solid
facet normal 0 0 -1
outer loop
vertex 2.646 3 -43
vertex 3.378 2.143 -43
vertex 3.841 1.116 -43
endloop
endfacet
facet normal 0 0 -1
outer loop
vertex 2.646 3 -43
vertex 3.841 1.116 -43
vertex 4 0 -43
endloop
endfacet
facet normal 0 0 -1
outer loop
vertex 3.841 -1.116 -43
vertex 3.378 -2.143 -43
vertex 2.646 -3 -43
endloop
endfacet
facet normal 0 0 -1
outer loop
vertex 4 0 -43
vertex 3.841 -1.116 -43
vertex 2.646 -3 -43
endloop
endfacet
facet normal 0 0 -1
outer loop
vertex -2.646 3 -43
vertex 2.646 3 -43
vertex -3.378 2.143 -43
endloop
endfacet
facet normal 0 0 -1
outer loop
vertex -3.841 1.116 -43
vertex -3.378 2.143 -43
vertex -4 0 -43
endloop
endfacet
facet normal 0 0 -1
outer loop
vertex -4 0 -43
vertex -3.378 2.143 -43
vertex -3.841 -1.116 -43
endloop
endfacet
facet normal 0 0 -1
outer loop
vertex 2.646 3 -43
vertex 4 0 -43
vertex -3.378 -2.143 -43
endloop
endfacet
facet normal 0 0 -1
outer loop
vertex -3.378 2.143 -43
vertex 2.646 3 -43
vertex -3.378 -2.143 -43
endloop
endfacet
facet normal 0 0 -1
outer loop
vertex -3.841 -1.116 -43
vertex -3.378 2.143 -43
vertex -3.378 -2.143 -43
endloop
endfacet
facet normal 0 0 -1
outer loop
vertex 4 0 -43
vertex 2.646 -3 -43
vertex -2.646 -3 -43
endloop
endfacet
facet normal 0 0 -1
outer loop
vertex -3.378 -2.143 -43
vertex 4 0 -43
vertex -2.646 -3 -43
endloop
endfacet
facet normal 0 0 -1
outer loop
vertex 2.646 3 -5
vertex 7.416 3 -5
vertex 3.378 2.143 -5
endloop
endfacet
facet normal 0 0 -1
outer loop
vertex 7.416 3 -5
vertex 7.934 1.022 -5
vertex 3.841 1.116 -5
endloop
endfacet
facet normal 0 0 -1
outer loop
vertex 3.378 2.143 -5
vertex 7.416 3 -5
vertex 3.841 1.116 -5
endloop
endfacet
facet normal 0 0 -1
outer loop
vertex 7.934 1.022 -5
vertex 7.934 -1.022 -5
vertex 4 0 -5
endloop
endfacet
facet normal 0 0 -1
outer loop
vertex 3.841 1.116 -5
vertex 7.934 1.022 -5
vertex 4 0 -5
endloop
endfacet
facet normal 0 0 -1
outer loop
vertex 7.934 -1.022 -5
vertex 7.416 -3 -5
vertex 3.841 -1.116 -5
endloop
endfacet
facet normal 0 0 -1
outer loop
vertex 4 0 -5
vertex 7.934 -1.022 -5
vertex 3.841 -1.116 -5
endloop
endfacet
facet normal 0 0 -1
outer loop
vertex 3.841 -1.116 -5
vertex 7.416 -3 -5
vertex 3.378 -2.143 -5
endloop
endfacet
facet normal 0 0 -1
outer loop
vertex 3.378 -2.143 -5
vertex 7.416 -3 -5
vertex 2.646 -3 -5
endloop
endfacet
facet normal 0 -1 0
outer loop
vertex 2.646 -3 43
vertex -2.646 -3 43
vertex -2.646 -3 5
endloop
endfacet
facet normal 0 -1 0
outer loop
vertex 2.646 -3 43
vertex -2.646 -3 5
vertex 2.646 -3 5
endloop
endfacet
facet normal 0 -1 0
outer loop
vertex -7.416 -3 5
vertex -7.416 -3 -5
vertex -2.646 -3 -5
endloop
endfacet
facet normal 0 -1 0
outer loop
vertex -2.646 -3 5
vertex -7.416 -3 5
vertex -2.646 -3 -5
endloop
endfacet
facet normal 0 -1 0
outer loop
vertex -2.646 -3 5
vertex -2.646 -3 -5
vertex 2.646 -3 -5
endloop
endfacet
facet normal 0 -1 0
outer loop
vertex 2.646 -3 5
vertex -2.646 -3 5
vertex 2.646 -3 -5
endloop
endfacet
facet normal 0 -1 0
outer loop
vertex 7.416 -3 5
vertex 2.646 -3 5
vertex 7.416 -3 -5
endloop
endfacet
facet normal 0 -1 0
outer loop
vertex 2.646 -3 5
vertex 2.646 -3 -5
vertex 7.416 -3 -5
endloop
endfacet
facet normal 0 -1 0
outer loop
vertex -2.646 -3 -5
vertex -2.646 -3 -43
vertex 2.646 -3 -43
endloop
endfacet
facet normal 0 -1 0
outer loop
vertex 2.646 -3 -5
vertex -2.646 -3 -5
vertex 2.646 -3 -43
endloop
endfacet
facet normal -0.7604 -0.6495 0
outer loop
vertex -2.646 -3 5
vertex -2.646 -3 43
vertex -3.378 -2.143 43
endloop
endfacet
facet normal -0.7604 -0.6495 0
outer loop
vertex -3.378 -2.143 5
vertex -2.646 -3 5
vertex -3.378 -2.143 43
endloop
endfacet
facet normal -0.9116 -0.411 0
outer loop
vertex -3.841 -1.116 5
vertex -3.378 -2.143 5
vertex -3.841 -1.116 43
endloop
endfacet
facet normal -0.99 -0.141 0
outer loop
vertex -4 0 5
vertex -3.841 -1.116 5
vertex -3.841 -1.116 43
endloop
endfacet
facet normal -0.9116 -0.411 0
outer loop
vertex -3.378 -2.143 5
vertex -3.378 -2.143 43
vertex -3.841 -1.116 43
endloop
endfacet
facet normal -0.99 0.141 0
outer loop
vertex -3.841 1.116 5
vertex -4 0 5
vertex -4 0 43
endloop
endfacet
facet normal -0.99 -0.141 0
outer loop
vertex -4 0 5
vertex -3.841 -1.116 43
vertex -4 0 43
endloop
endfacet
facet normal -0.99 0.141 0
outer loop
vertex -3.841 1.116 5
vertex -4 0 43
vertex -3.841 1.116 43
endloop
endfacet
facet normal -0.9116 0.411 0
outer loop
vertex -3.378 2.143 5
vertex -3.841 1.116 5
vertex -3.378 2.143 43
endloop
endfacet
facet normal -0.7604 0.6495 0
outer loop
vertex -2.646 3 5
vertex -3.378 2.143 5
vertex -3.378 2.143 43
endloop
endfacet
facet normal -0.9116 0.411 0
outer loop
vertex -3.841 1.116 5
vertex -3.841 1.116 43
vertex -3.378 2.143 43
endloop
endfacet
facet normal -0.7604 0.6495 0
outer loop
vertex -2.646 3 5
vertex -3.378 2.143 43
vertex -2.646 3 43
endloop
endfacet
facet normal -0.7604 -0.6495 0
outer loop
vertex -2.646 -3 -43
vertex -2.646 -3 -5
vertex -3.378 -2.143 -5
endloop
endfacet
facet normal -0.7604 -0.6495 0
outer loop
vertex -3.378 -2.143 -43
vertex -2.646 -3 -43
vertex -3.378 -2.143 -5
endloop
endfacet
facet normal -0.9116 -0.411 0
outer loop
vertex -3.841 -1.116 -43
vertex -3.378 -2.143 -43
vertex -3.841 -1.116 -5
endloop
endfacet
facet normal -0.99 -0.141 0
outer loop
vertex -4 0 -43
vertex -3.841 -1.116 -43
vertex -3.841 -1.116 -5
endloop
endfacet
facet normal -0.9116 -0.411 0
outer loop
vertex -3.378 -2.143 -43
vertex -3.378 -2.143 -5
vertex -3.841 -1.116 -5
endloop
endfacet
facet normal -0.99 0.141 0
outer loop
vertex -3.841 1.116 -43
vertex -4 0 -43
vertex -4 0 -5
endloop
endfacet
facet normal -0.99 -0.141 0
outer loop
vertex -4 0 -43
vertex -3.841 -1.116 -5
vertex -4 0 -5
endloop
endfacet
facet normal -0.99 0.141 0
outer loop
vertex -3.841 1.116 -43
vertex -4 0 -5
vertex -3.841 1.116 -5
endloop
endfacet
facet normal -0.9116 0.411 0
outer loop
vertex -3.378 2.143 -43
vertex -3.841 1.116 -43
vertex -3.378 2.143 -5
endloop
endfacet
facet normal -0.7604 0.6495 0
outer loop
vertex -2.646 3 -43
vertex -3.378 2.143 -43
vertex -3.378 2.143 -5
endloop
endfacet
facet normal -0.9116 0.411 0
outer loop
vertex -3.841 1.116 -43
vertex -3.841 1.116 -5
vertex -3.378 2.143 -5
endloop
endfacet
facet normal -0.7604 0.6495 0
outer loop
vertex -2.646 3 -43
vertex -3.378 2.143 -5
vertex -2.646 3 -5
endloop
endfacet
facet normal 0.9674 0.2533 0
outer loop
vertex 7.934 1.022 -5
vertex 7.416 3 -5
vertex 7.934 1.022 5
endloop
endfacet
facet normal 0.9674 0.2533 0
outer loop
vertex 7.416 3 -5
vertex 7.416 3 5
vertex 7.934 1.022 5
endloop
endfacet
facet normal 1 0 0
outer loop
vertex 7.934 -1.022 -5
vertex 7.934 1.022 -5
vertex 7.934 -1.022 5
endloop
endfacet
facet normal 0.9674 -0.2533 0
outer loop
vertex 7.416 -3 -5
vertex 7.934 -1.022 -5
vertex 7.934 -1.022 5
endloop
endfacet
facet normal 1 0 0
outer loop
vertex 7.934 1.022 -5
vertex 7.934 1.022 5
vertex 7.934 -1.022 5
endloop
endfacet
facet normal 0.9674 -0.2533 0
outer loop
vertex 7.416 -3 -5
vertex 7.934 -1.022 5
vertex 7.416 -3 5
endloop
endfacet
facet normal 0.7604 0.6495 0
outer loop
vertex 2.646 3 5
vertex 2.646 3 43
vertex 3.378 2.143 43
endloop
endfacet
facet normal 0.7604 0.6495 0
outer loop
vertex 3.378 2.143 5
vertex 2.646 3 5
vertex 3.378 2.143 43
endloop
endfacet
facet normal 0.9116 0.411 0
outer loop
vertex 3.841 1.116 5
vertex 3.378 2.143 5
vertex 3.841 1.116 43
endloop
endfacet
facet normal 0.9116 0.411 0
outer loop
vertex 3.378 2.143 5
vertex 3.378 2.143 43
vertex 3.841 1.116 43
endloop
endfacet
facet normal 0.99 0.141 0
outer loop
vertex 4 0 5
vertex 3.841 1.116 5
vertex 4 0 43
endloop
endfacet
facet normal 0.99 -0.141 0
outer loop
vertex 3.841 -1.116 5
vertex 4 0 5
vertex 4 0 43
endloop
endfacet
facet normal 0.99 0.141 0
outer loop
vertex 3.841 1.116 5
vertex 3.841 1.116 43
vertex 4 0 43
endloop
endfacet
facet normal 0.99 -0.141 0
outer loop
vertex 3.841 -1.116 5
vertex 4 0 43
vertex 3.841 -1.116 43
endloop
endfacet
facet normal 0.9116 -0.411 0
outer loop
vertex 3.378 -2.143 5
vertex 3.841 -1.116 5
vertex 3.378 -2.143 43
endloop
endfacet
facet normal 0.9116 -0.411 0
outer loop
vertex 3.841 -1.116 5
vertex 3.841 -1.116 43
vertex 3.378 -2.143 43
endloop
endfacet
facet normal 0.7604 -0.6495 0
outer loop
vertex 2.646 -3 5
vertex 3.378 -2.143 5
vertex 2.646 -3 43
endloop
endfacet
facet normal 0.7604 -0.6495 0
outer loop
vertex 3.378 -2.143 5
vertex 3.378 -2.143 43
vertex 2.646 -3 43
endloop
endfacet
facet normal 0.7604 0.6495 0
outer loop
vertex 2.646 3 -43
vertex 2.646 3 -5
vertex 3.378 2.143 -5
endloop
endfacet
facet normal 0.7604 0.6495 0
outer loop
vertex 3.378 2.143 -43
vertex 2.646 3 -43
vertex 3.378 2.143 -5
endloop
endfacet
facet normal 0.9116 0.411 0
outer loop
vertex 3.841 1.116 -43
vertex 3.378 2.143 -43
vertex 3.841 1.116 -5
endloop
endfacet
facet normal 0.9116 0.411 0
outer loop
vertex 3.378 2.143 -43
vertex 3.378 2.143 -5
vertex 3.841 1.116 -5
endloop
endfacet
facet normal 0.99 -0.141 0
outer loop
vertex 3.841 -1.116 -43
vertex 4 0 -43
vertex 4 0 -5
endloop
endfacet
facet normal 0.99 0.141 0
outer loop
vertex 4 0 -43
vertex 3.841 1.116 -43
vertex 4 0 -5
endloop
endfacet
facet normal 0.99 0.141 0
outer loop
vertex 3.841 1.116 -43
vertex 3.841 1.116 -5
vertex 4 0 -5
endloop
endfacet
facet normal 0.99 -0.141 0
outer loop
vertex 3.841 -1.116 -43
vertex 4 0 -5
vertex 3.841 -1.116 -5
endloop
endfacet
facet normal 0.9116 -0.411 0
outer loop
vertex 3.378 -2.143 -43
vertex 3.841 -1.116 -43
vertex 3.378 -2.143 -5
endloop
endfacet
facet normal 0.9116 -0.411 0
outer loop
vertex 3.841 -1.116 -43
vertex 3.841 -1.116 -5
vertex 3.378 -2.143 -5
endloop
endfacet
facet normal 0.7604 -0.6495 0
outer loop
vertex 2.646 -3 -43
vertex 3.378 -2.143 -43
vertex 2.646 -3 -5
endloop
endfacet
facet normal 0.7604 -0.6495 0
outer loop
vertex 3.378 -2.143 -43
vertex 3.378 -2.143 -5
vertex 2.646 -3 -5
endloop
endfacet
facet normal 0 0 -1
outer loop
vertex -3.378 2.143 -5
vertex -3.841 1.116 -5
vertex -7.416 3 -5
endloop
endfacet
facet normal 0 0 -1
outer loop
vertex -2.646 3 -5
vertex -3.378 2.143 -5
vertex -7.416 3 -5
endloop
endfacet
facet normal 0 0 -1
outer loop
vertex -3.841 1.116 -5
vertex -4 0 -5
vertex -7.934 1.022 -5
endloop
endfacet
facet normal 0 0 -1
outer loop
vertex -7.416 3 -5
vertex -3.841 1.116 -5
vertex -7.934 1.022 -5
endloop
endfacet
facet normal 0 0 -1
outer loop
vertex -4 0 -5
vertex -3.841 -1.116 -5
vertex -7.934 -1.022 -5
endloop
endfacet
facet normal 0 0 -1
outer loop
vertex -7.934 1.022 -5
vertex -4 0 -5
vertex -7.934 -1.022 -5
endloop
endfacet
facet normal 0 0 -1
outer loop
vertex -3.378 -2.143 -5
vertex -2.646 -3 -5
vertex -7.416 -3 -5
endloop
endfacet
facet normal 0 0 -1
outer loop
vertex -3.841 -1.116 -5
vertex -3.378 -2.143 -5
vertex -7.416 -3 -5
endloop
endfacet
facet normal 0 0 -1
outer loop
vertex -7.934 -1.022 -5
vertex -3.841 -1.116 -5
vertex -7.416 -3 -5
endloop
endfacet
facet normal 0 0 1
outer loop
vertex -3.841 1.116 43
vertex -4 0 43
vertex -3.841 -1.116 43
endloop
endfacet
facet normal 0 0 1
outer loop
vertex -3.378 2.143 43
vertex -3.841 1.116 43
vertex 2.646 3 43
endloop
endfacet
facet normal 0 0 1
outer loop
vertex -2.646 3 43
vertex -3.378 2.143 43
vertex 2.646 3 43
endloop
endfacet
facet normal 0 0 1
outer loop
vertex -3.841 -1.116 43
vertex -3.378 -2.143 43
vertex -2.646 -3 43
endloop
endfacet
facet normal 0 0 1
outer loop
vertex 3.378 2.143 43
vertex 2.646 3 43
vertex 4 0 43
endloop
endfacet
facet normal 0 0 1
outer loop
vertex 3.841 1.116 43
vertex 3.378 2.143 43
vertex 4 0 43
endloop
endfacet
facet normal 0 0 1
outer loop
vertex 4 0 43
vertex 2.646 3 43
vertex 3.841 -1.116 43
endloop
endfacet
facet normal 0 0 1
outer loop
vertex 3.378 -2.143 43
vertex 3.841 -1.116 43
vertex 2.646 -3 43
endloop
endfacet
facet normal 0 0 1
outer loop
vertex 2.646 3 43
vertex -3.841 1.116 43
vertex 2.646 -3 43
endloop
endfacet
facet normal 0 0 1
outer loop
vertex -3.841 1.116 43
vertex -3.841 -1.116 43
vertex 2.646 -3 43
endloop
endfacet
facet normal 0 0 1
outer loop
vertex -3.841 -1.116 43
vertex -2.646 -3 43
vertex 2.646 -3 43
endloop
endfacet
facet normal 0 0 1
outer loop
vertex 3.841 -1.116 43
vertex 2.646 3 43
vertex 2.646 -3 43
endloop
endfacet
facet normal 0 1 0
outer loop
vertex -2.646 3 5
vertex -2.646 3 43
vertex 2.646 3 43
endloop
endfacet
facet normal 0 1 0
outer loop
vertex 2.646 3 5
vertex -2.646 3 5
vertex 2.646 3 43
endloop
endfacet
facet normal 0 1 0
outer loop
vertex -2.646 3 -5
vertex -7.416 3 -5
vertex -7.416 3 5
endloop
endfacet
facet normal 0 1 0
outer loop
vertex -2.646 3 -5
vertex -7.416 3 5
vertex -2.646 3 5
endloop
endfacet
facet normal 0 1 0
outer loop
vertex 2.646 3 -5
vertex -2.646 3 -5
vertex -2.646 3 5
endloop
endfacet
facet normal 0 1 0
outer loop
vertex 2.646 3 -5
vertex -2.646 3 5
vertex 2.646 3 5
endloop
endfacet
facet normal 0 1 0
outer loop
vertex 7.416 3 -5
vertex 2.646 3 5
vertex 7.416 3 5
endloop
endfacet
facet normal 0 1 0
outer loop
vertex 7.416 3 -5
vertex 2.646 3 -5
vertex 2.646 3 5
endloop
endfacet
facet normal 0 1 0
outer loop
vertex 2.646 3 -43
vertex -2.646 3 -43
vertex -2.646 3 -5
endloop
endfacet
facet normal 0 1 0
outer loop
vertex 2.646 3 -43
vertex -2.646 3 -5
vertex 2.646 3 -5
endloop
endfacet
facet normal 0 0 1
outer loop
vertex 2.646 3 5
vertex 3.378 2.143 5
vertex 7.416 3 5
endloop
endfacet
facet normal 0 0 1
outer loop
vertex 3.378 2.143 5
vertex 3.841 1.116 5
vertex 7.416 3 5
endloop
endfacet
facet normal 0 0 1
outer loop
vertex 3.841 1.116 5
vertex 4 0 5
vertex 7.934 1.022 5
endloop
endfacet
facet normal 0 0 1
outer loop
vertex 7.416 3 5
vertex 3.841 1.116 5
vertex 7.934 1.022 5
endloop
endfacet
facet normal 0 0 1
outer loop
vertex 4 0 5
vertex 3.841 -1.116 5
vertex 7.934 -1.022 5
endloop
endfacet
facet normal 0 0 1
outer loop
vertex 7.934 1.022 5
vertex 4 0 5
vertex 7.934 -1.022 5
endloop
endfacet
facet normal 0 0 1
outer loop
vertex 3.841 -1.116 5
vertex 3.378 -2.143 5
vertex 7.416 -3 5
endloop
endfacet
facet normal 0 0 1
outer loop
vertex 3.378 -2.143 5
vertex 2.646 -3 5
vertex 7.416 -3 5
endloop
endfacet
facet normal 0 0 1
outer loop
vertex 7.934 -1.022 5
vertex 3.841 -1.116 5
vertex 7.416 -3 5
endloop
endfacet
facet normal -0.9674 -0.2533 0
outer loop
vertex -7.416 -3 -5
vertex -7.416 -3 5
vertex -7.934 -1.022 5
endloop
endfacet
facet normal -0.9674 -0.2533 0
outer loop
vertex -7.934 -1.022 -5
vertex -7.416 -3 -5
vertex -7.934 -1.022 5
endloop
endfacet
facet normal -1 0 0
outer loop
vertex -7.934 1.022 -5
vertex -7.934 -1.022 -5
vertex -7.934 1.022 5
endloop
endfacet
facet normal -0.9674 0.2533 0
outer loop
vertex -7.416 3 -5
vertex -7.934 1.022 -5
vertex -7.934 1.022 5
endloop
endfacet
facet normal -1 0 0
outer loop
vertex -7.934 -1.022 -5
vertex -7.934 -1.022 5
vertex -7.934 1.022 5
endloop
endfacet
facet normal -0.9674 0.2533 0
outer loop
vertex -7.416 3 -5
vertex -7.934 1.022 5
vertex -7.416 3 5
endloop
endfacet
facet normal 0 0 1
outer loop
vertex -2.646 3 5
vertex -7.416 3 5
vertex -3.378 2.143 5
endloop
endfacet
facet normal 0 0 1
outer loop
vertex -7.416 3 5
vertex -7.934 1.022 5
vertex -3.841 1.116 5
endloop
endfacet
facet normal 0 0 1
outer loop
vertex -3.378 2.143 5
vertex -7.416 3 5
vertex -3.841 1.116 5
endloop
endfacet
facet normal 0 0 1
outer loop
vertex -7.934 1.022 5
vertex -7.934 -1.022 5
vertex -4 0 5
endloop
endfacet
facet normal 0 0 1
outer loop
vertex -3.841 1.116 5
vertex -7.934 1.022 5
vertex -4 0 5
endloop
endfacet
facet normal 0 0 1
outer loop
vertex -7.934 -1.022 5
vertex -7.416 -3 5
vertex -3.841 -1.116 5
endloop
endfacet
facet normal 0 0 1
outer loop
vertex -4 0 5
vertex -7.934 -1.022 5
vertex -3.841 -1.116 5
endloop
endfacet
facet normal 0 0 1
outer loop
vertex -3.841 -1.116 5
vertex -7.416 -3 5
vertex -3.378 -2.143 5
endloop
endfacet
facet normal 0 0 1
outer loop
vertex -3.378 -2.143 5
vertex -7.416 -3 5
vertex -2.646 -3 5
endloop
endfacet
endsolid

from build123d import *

# Parameters (mm, degrees)
CUT_EXTRUDE1_DEPTH      = 45.463468151
CUT_EXTRUDE1_DEPTH_BACK = 45.463468151
SKETCH2_W               = 16
SKETCH2_H               = 5


with BuildPart() as part:
    # Sketch1 → Revolve1 (revolve)
    with BuildSketch(Plane(origin=(0, 0, 0), x_dir=(1, 0, 0), z_dir=(0, 1, 0))):
        Polygon((4, 43), (4, 5), (8, 5), (8, -5), (4, -5), (4, -43), (0, -43), (0, 43), align=None)
    revolve(axis=Axis((0, 0, 43), (0, 0, -1)))

    # Sketch2 → Cut-Extrude1 (cut, two sides: drawn at the far end of the back side and taken through both)
    with BuildSketch(Plane.XY.offset(-CUT_EXTRUDE1_DEPTH_BACK)):
        with Locations((0, 5.5)):
            Rectangle(SKETCH2_W, SKETCH2_H)
        with Locations((0, -5.5)):
            Rectangle(SKETCH2_W, SKETCH2_H)
    extrude(amount=CUT_EXTRUDE1_DEPTH + CUT_EXTRUDE1_DEPTH_BACK, mode=Mode.SUBTRACT)


solid = part.part
